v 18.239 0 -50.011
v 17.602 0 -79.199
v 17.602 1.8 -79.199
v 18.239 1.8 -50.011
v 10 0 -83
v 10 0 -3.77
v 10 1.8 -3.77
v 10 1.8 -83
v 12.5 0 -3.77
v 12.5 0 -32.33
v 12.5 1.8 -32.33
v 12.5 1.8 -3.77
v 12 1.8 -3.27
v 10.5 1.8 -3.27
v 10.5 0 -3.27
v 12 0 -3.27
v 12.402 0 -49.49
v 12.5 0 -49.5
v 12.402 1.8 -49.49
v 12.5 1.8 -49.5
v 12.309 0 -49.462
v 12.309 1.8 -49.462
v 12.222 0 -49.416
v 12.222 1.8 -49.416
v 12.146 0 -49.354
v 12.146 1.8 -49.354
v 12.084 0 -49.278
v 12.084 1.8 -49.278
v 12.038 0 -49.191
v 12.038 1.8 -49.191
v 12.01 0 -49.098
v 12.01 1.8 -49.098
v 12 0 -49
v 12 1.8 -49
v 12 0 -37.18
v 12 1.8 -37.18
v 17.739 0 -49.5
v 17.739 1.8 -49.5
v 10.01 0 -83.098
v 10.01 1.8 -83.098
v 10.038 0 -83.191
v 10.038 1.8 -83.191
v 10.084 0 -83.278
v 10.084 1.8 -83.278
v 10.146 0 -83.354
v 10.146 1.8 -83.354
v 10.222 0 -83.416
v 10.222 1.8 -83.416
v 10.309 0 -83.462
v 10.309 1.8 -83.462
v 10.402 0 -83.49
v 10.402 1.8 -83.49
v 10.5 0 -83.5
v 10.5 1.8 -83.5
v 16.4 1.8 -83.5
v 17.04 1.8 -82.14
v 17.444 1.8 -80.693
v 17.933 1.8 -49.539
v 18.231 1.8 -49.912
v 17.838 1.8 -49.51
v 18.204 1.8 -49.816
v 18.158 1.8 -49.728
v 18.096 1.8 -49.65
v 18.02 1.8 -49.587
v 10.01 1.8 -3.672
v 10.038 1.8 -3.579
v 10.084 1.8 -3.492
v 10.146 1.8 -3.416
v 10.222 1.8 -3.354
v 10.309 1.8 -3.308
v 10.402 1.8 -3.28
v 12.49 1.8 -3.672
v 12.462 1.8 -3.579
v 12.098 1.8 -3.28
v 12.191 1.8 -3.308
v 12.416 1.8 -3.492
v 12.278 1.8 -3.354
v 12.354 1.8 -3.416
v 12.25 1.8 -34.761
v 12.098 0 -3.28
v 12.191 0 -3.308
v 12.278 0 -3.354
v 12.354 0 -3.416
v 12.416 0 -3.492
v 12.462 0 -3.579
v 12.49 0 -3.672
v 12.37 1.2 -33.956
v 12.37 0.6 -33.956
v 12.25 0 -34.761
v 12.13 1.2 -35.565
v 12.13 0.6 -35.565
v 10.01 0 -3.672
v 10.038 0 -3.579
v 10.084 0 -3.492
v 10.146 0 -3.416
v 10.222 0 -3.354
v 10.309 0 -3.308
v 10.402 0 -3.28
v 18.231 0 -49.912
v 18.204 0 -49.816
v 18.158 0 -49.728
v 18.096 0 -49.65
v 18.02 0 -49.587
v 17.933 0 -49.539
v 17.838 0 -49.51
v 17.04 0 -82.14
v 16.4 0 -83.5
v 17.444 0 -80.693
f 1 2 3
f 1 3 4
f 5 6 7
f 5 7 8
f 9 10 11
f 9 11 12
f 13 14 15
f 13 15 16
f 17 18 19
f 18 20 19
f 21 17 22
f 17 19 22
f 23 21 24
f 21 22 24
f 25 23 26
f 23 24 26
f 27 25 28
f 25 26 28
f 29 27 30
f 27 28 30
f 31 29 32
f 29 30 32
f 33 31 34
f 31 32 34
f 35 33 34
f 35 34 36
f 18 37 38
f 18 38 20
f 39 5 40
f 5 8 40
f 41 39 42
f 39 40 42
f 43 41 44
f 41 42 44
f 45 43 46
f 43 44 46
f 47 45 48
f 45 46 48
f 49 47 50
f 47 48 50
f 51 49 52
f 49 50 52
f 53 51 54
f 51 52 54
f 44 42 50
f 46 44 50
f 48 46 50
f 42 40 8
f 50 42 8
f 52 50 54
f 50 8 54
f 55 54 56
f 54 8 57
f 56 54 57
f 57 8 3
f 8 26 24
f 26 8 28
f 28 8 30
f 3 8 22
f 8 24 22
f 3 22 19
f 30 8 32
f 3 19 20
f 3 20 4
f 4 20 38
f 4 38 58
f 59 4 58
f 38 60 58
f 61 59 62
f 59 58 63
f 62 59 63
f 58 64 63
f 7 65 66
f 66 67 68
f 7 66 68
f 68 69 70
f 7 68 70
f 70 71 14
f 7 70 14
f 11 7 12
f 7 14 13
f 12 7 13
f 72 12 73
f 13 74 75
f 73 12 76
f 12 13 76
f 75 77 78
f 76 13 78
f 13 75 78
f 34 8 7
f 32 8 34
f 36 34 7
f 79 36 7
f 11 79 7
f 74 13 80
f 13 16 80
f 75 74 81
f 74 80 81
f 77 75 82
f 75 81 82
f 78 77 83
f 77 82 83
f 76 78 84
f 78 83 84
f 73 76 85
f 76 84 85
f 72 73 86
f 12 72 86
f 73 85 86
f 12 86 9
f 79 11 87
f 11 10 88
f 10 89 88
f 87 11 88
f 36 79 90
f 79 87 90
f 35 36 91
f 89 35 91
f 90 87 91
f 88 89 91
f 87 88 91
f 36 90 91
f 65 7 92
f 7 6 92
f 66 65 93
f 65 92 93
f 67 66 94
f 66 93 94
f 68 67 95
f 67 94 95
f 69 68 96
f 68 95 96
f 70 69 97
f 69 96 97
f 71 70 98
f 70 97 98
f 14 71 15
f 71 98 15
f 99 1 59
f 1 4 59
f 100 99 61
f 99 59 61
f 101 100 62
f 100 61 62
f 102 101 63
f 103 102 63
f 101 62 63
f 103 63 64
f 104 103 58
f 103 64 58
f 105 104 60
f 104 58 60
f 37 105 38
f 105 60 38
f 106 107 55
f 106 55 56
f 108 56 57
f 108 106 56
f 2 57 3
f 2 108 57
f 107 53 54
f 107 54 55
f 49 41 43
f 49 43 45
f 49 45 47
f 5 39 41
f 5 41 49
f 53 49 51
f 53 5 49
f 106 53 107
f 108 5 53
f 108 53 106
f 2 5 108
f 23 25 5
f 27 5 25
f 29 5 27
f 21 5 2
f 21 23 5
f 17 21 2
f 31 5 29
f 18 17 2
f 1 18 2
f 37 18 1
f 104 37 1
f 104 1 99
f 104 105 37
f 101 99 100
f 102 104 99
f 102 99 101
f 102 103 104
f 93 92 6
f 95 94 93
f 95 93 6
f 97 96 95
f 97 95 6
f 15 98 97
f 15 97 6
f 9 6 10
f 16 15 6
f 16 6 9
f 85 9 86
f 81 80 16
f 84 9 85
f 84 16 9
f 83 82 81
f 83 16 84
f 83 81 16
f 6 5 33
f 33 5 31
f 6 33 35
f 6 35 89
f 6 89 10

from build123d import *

# Parameters (mm, degrees)
BOSS_EXTRUDE1_DEPTH = 1.8
FILLET2_R           = 0.5
SKETCH3_R           = 2.5
SKETCH3_R_2         = 1.75
BOSS_EXTRUDE2_DEPTH = 1.8
FILLET3_R           = 1
CUT_EXTRUDE1_DEPTH  = 2.8000001
FILLET4_R           = 0.5


with BuildPart() as part:
    # Sketch1 → Boss-Extrude1 (new body)
    with BuildSketch(Plane(origin=(0, 0, 0), x_dir=(1, 0, 0), z_dir=(0, 1, 0))):
        with BuildLine():
            Line((0, 4.5), (0, 6.5))
            Line((0, 6.5), (6.1, 6.5))
            Line((6.1, 6.5), (6.1, 10.5))
            Line((6.1, 10.5), (10, 14.4))
            Line((10, 14.4), (10, 83.5))
            Line((10, 83.5), (16.4, 83.5))
            ThreePointArc((16.4, 83.5), (17.2719581, 81.425344658), (17.601960582, 79.199226044))
            Line((17.601960582, 79.199226044), (18.25, 49.5))
            Line((18.25, 49.5), (12, 49.5))
            Line((12, 49.5), (12, 37.18))
            add(Edge.make_bspline(
                [(12.5, 32.33), (12.5, 33.972282338), (12, 35.554764974), (12, 37.18)],
                knots=[0, 0, 0, 0, 1, 1, 1, 1], degree=3))
            Line((12.5, 32.33), (12.5, 3.07))
            ThreePointArc((12.5, 3.07), (11.600817818, 0.899182182), (9.43, 0))
            ThreePointArc((9.43, 0), (4.205660329, 1.182650422), (0, 4.5))
        make_face()
    extrude(amount=BOSS_EXTRUDE1_DEPTH)

    # Fillet2
    fillet2_edges = [part.edges().sort_by_distance(p)[0] for p in [
        (0, 0.9, -6.5),
        (6.1, 0.9, -6.5),
        (6.1, 0.9, -10.5),
        (10, 0.9, -14.4),
        (10, 0.9, -83.5),
        (18.25, 0.9, -49.5),
        (12, 0.9, -49.5),
    ]]
    fillet(fillet2_edges, radius=FILLET2_R)

    # Sketch3 → Boss-Extrude2 (add)
    with BuildSketch(Plane.XZ):
        with Locations((9.5, 2.499832541)):
            Circle(SKETCH3_R)
        with Locations((9.5, 2.499832541)):
            Circle(SKETCH3_R_2, mode=Mode.SUBTRACT)
        with BuildLine():
            ThreePointArc((11.824045318, 1.578521867), (9.031018815, 0.044215175), (7, 2.499832541))
            Line((7, 2.499832541), (7, -0.245881701))
            ThreePointArc((7, -0.245881701), (8.2087959, -0.061626967), (9.43, 0))
            ThreePointArc((9.43, 0), (10.256451345, -0.113333266), (11.021883517, -0.444965358))
            Line((11.021883517, -0.444965358), (11.824045318, 1.578521867))
        make_face()
        with BuildLine():
            ThreePointArc((9.43, 0), (8.2087959, -0.061626967), (7, -0.245881701))
            Line((7, -0.245881701), (7, -0.500167459))
            Line((7, -0.500167459), (11, -0.500167459))
            Line((11, -0.500167459), (11.021883517, -0.444965358))
            ThreePointArc((11.021883517, -0.444965358), (10.256451345, -0.113333266), (9.43, 0))
        make_face()
    extrude(amount=-BOSS_EXTRUDE2_DEPTH)

    # Fillet3
    fillet3_edges = [part.edges().sort_by_distance(p)[0] for p in [
        (7, 0.9, -0.245881701),
        (11.021883517, 0.9, -0.444965358),
    ]]
    fillet(fillet3_edges, radius=FILLET3_R)

    # Sketch4 → Cut-Extrude1 (cut, through all)
    with BuildSketch(Plane(origin=(0, 1.8, 0), x_dir=(1, 0, 0), z_dir=(0, 1, 0))):
        Polygon((10, 18.881660772), (10, 3.27), (13.61834734, 3.27), (13.61834734, -6.687183429), (-3.427548793, -6.687183429), (-3.427548793, 18.881660772), align=None)
    extrude(amount=-CUT_EXTRUDE1_DEPTH, mode=Mode.SUBTRACT)

    # Fillet4
    fillet4_edges = [part.edges().sort_by_distance(p)[0] for p in [
        (12.5, 0.9, -3.27),
        (10, 0.9, -3.27),
    ]]
    fillet(fillet4_edges, radius=FILLET4_R)


solid = part.part
